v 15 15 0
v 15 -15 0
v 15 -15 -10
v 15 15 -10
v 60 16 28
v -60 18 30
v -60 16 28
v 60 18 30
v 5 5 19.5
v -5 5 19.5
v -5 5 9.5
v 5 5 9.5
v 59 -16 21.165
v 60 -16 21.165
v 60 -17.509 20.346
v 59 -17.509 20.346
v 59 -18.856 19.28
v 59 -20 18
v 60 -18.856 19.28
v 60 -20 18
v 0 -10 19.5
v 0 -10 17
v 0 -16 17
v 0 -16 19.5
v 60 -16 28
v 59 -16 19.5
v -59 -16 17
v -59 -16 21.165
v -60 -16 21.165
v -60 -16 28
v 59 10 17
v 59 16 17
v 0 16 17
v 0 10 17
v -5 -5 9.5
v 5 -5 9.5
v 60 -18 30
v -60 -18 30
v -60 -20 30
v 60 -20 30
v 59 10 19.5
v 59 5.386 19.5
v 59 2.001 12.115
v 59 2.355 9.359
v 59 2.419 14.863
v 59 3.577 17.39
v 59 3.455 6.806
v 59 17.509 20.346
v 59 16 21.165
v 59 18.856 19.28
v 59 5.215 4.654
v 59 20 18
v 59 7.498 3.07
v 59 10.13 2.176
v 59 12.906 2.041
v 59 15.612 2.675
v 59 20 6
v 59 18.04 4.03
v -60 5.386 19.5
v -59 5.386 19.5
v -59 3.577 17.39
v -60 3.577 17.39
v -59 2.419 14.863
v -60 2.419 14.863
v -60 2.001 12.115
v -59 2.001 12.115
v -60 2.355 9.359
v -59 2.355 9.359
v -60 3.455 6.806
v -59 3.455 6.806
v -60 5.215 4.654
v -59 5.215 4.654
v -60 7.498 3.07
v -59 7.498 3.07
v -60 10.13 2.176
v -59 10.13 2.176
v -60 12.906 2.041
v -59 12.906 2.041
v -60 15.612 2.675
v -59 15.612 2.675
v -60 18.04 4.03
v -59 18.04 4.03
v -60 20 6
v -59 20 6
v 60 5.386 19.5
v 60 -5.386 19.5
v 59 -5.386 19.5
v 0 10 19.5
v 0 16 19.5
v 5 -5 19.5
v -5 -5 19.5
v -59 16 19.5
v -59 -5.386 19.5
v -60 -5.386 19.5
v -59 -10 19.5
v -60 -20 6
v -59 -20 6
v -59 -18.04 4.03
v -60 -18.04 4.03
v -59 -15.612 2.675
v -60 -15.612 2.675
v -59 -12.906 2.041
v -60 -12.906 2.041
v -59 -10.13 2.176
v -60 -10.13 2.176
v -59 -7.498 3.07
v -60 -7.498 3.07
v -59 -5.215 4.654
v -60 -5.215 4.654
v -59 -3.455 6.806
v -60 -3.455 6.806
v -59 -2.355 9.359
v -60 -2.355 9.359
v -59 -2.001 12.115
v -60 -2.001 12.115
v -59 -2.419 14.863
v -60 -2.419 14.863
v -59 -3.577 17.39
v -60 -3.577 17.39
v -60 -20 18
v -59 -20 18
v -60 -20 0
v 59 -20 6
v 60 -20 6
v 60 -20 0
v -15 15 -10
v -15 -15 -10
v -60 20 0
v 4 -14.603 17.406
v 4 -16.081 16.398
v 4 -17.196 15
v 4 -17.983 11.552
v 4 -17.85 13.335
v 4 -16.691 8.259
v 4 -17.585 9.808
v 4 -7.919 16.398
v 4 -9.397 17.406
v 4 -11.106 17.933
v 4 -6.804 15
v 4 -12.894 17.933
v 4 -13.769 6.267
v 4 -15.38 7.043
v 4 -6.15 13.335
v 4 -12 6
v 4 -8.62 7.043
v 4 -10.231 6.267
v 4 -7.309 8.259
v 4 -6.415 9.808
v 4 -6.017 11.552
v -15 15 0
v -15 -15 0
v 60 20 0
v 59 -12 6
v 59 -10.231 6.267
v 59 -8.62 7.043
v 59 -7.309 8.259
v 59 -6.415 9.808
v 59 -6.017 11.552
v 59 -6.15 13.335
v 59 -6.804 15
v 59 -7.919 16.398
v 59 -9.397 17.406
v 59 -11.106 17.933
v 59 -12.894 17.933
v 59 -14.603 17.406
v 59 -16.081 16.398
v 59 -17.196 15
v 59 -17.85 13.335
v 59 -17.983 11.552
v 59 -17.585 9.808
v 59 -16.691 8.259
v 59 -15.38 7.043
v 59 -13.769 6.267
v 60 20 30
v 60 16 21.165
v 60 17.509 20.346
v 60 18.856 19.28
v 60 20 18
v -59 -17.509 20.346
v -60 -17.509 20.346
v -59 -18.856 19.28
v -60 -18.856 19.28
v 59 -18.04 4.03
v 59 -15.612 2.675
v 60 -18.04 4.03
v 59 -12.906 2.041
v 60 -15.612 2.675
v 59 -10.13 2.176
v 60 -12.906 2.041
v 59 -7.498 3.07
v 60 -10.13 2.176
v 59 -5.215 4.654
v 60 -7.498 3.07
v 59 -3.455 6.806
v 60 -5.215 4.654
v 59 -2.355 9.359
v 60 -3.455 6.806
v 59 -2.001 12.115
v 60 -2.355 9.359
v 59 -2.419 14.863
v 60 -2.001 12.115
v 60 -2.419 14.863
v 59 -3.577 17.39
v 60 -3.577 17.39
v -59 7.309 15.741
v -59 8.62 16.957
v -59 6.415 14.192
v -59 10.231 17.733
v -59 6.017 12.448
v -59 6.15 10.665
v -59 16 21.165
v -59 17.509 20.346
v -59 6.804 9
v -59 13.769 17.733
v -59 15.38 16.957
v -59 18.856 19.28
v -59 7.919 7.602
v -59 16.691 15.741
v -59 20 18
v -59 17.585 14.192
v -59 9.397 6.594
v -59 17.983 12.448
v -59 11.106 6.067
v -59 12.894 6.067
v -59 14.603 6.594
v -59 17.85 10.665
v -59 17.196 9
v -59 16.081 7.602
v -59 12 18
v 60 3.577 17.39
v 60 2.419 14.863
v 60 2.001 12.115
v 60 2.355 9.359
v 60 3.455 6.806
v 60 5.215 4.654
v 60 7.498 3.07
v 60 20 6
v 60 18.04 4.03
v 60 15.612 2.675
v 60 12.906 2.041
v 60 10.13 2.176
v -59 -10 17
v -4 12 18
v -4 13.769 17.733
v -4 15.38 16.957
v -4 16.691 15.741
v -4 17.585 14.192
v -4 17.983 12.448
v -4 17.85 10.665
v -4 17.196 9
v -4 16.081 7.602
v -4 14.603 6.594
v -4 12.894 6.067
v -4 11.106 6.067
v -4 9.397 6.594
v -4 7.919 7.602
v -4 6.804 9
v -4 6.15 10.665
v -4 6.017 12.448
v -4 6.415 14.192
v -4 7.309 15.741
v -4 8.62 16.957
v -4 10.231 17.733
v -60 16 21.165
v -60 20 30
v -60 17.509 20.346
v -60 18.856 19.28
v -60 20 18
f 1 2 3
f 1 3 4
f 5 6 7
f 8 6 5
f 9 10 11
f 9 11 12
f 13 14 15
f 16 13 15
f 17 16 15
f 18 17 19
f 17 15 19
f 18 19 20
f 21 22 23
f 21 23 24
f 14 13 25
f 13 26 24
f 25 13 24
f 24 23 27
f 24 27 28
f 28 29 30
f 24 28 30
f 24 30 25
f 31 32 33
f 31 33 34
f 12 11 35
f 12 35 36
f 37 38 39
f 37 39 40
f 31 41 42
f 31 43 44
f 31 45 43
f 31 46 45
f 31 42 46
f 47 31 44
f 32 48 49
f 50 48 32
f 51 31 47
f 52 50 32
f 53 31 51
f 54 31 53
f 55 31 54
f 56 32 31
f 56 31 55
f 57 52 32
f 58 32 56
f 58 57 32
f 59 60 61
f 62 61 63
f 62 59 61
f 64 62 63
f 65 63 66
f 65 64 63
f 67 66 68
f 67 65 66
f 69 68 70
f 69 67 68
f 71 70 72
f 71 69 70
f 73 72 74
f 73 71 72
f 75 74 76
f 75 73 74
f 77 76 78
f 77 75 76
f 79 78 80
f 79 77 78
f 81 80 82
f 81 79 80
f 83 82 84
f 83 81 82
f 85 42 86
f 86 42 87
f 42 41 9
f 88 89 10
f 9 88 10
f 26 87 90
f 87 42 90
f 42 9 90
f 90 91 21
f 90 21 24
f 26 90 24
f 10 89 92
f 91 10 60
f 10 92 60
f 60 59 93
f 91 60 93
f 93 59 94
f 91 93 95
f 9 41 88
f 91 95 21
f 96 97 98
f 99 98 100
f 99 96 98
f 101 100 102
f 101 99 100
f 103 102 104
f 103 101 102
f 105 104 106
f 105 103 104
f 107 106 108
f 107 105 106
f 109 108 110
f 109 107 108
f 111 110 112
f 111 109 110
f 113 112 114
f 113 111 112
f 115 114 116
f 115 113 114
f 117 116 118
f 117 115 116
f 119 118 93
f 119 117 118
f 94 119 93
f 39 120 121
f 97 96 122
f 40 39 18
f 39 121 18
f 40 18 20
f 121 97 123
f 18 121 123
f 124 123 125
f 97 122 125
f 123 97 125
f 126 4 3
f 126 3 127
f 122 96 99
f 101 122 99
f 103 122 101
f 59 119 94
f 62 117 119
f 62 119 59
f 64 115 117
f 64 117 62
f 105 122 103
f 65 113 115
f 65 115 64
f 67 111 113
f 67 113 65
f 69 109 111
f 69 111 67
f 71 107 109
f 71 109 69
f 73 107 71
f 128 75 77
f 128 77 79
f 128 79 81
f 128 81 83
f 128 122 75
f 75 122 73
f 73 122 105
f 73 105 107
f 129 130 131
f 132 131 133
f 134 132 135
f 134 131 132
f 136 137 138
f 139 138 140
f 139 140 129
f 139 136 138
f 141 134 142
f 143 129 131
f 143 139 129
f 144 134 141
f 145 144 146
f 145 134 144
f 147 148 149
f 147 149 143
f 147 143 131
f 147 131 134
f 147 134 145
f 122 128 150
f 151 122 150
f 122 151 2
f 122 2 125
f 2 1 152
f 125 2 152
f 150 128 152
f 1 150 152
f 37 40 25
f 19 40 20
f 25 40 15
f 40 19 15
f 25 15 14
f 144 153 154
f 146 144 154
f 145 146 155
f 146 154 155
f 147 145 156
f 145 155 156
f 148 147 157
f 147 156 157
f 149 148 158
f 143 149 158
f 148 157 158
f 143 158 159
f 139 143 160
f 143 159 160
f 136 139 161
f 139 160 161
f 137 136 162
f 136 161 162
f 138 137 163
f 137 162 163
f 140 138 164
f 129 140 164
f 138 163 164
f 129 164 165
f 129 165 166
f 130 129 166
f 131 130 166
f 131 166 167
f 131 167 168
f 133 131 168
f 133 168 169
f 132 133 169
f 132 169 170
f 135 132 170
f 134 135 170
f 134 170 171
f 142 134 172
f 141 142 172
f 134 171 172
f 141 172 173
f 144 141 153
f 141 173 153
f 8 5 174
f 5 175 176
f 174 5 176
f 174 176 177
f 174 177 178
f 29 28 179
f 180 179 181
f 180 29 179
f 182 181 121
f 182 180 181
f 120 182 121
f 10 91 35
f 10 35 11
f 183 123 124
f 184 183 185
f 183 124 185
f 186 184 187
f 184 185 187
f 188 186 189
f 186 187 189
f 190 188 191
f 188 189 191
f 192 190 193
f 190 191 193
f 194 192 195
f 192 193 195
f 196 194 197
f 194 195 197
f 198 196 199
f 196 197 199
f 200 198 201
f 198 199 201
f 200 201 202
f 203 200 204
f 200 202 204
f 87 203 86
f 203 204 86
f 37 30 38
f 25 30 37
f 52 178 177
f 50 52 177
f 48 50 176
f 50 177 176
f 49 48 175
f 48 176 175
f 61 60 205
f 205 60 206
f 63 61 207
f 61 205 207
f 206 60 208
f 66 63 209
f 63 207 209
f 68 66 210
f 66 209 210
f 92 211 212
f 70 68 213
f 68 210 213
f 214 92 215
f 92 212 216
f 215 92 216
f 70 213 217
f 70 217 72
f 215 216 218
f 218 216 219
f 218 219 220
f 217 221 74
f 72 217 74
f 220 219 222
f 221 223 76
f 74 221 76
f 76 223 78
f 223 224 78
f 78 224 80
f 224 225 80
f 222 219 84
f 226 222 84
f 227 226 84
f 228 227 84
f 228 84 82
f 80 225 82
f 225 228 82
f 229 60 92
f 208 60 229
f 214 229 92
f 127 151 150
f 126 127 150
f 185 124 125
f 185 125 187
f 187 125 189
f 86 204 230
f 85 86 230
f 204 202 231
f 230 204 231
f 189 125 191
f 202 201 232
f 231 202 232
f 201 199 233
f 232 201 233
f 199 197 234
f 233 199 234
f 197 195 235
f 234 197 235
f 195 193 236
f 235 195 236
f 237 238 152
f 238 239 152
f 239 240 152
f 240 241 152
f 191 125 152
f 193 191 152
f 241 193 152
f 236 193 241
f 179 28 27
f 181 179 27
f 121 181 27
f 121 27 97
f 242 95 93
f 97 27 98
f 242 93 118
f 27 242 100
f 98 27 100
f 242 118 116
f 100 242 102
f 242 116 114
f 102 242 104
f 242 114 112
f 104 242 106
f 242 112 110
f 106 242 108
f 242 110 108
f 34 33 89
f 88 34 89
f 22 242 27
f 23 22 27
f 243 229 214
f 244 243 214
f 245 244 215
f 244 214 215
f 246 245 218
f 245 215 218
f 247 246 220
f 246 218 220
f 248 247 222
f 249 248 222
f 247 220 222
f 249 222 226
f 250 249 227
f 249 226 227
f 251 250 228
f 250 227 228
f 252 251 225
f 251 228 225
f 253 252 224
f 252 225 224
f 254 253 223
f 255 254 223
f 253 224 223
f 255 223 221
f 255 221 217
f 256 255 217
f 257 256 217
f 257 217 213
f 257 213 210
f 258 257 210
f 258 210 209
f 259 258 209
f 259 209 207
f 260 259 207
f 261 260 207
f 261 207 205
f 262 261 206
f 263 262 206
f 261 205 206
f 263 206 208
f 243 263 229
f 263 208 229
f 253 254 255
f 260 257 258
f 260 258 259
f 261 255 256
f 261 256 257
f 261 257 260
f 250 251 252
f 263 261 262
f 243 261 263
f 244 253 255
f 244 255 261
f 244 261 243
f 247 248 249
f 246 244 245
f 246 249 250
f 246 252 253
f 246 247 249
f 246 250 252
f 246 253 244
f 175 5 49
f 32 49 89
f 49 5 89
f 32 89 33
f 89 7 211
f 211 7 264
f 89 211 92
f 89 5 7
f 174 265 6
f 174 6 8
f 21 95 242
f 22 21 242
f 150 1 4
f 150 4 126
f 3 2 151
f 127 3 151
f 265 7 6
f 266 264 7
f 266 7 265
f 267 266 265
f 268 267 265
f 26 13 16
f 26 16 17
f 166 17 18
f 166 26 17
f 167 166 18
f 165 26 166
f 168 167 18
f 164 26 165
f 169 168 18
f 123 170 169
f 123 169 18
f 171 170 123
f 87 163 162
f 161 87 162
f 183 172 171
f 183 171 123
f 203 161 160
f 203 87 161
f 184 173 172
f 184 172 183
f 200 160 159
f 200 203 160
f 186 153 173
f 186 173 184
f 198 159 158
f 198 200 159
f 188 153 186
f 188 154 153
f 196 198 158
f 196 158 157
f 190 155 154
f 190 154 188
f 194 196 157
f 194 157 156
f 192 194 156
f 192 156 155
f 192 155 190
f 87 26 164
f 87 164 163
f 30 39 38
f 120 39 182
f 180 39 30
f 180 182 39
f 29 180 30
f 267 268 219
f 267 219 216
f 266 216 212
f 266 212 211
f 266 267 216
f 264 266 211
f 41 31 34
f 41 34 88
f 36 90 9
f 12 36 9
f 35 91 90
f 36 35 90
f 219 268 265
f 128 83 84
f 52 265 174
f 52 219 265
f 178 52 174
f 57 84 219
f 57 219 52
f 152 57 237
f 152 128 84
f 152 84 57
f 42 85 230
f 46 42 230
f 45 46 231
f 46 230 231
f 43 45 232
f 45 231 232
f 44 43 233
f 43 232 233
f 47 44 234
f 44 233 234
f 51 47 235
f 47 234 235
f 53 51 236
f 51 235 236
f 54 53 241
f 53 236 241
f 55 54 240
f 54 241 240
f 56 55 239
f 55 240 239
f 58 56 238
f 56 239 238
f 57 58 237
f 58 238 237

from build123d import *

# Parameters (mm, degrees)
SKETCH1_W           = 120
SKETCH1_H           = 40
BOSS_EXTRUDE1_DEPTH = 30
CUT_EXTRUDE1_DEPTH  = 60
CUT_EXTRUDE2_DEPTH  = 60
SKETCH4_W           = 30
SKETCH4_H           = 30
BOSS_EXTRUDE2_DEPTH = 10
SKETCH5_R           = 10
CUT_EXTRUDE3_DEPTH  = 1
SKETCH7_R           = 6
CUT_EXTRUDE5_DEPTH  = 55
SKETCH6_W           = 10
SKETCH6_H           = 10
CUT_EXTRUDE4_DEPTH  = 10
CHAMFER1_SIZE       = 2
SKETCH8_R           = 6
CUT_EXTRUDE6_DEPTH  = 55


with BuildPart() as part:
    # Sketch1 → Boss-Extrude1 (new body)
    with BuildSketch(Plane.XY):
        Rectangle(SKETCH1_W, SKETCH1_H)
    extrude(amount=BOSS_EXTRUDE1_DEPTH)

    # Sketch2 → Cut-Extrude1 (cut)
    with BuildSketch(Plane(origin=(60, 0, 0), x_dir=(0, 0, -1), z_dir=(1, 0, 0))):
        Polygon((-30, 16), (-19.782067596, 16), (-17, 16), (-17, 10), (-19.5, 10), (-19.5, -16), (-30, -16), align=None)
    extrude(amount=-CUT_EXTRUDE1_DEPTH, mode=Mode.SUBTRACT)

    # Sketch3 → Cut-Extrude2 (cut)
    with BuildSketch(Plane.ZY.offset(60)):
        Polygon((30, 16), (19.5, 16), (19.5, -10), (17, -10), (17, -16), (18.436994707, -16), (30, -16), align=None)
    extrude(amount=-CUT_EXTRUDE2_DEPTH, mode=Mode.SUBTRACT)

    # Sketch4 → Boss-Extrude2 (add)
    with BuildSketch(Plane(origin=(0, 0, 0), x_dir=(-1, 0, 0), z_dir=(0, 0, -1))):
        Rectangle(SKETCH4_W, SKETCH4_H)
    extrude(amount=BOSS_EXTRUDE2_DEPTH)

    # Sketch5 → Cut-Extrude3 (cut)
    with BuildSketch(Plane(origin=(60, 0, 0), x_dir=(0, 0, -1), z_dir=(1, 0, 0))):
        with Locations((-12, 12)):
            Circle(SKETCH5_R)
        with Locations((-12, -12)):
            Circle(SKETCH5_R)
    cut_extrude3 = extrude(amount=-CUT_EXTRUDE3_DEPTH, mode=Mode.SUBTRACT)

    # Sketch7 → Cut-Extrude5 (cut)
    with BuildSketch(Plane(origin=(59, 0, 0), x_dir=(0, 0, -1), z_dir=(1, 0, 0))):
        with Locations((-12, -12)):
            Circle(SKETCH7_R)
    extrude(amount=-CUT_EXTRUDE5_DEPTH, mode=Mode.SUBTRACT)

    # Mirror1: Cut-Extrude3 across plane
    add(cut_extrude3.mirror(Plane(origin=(0, 0, 0), x_dir=(0, 0, 1), z_dir=(1, 0, 0))), mode=Mode.SUBTRACT)

    # Sketch6 → Cut-Extrude4 (cut)
    with BuildSketch(Plane.XY.offset(19.5)):
        Rectangle(SKETCH6_W, SKETCH6_H)
    extrude(amount=-CUT_EXTRUDE4_DEPTH, mode=Mode.SUBTRACT)

    # Chamfer1
    chamfer1_edges = [part.edges().sort_by_distance(p)[0] for p in [
        (0, -16, 30),
        (0, 16, 30),
    ]]
    chamfer(chamfer1_edges, length=CHAMFER1_SIZE)

    # Sketch8 → Cut-Extrude6 (cut)
    with BuildSketch(Plane.ZY.offset(59)):
        with Locations((12, 12)):
            Circle(SKETCH8_R)
    extrude(amount=-CUT_EXTRUDE6_DEPTH, mode=Mode.SUBTRACT)


solid = part.part
